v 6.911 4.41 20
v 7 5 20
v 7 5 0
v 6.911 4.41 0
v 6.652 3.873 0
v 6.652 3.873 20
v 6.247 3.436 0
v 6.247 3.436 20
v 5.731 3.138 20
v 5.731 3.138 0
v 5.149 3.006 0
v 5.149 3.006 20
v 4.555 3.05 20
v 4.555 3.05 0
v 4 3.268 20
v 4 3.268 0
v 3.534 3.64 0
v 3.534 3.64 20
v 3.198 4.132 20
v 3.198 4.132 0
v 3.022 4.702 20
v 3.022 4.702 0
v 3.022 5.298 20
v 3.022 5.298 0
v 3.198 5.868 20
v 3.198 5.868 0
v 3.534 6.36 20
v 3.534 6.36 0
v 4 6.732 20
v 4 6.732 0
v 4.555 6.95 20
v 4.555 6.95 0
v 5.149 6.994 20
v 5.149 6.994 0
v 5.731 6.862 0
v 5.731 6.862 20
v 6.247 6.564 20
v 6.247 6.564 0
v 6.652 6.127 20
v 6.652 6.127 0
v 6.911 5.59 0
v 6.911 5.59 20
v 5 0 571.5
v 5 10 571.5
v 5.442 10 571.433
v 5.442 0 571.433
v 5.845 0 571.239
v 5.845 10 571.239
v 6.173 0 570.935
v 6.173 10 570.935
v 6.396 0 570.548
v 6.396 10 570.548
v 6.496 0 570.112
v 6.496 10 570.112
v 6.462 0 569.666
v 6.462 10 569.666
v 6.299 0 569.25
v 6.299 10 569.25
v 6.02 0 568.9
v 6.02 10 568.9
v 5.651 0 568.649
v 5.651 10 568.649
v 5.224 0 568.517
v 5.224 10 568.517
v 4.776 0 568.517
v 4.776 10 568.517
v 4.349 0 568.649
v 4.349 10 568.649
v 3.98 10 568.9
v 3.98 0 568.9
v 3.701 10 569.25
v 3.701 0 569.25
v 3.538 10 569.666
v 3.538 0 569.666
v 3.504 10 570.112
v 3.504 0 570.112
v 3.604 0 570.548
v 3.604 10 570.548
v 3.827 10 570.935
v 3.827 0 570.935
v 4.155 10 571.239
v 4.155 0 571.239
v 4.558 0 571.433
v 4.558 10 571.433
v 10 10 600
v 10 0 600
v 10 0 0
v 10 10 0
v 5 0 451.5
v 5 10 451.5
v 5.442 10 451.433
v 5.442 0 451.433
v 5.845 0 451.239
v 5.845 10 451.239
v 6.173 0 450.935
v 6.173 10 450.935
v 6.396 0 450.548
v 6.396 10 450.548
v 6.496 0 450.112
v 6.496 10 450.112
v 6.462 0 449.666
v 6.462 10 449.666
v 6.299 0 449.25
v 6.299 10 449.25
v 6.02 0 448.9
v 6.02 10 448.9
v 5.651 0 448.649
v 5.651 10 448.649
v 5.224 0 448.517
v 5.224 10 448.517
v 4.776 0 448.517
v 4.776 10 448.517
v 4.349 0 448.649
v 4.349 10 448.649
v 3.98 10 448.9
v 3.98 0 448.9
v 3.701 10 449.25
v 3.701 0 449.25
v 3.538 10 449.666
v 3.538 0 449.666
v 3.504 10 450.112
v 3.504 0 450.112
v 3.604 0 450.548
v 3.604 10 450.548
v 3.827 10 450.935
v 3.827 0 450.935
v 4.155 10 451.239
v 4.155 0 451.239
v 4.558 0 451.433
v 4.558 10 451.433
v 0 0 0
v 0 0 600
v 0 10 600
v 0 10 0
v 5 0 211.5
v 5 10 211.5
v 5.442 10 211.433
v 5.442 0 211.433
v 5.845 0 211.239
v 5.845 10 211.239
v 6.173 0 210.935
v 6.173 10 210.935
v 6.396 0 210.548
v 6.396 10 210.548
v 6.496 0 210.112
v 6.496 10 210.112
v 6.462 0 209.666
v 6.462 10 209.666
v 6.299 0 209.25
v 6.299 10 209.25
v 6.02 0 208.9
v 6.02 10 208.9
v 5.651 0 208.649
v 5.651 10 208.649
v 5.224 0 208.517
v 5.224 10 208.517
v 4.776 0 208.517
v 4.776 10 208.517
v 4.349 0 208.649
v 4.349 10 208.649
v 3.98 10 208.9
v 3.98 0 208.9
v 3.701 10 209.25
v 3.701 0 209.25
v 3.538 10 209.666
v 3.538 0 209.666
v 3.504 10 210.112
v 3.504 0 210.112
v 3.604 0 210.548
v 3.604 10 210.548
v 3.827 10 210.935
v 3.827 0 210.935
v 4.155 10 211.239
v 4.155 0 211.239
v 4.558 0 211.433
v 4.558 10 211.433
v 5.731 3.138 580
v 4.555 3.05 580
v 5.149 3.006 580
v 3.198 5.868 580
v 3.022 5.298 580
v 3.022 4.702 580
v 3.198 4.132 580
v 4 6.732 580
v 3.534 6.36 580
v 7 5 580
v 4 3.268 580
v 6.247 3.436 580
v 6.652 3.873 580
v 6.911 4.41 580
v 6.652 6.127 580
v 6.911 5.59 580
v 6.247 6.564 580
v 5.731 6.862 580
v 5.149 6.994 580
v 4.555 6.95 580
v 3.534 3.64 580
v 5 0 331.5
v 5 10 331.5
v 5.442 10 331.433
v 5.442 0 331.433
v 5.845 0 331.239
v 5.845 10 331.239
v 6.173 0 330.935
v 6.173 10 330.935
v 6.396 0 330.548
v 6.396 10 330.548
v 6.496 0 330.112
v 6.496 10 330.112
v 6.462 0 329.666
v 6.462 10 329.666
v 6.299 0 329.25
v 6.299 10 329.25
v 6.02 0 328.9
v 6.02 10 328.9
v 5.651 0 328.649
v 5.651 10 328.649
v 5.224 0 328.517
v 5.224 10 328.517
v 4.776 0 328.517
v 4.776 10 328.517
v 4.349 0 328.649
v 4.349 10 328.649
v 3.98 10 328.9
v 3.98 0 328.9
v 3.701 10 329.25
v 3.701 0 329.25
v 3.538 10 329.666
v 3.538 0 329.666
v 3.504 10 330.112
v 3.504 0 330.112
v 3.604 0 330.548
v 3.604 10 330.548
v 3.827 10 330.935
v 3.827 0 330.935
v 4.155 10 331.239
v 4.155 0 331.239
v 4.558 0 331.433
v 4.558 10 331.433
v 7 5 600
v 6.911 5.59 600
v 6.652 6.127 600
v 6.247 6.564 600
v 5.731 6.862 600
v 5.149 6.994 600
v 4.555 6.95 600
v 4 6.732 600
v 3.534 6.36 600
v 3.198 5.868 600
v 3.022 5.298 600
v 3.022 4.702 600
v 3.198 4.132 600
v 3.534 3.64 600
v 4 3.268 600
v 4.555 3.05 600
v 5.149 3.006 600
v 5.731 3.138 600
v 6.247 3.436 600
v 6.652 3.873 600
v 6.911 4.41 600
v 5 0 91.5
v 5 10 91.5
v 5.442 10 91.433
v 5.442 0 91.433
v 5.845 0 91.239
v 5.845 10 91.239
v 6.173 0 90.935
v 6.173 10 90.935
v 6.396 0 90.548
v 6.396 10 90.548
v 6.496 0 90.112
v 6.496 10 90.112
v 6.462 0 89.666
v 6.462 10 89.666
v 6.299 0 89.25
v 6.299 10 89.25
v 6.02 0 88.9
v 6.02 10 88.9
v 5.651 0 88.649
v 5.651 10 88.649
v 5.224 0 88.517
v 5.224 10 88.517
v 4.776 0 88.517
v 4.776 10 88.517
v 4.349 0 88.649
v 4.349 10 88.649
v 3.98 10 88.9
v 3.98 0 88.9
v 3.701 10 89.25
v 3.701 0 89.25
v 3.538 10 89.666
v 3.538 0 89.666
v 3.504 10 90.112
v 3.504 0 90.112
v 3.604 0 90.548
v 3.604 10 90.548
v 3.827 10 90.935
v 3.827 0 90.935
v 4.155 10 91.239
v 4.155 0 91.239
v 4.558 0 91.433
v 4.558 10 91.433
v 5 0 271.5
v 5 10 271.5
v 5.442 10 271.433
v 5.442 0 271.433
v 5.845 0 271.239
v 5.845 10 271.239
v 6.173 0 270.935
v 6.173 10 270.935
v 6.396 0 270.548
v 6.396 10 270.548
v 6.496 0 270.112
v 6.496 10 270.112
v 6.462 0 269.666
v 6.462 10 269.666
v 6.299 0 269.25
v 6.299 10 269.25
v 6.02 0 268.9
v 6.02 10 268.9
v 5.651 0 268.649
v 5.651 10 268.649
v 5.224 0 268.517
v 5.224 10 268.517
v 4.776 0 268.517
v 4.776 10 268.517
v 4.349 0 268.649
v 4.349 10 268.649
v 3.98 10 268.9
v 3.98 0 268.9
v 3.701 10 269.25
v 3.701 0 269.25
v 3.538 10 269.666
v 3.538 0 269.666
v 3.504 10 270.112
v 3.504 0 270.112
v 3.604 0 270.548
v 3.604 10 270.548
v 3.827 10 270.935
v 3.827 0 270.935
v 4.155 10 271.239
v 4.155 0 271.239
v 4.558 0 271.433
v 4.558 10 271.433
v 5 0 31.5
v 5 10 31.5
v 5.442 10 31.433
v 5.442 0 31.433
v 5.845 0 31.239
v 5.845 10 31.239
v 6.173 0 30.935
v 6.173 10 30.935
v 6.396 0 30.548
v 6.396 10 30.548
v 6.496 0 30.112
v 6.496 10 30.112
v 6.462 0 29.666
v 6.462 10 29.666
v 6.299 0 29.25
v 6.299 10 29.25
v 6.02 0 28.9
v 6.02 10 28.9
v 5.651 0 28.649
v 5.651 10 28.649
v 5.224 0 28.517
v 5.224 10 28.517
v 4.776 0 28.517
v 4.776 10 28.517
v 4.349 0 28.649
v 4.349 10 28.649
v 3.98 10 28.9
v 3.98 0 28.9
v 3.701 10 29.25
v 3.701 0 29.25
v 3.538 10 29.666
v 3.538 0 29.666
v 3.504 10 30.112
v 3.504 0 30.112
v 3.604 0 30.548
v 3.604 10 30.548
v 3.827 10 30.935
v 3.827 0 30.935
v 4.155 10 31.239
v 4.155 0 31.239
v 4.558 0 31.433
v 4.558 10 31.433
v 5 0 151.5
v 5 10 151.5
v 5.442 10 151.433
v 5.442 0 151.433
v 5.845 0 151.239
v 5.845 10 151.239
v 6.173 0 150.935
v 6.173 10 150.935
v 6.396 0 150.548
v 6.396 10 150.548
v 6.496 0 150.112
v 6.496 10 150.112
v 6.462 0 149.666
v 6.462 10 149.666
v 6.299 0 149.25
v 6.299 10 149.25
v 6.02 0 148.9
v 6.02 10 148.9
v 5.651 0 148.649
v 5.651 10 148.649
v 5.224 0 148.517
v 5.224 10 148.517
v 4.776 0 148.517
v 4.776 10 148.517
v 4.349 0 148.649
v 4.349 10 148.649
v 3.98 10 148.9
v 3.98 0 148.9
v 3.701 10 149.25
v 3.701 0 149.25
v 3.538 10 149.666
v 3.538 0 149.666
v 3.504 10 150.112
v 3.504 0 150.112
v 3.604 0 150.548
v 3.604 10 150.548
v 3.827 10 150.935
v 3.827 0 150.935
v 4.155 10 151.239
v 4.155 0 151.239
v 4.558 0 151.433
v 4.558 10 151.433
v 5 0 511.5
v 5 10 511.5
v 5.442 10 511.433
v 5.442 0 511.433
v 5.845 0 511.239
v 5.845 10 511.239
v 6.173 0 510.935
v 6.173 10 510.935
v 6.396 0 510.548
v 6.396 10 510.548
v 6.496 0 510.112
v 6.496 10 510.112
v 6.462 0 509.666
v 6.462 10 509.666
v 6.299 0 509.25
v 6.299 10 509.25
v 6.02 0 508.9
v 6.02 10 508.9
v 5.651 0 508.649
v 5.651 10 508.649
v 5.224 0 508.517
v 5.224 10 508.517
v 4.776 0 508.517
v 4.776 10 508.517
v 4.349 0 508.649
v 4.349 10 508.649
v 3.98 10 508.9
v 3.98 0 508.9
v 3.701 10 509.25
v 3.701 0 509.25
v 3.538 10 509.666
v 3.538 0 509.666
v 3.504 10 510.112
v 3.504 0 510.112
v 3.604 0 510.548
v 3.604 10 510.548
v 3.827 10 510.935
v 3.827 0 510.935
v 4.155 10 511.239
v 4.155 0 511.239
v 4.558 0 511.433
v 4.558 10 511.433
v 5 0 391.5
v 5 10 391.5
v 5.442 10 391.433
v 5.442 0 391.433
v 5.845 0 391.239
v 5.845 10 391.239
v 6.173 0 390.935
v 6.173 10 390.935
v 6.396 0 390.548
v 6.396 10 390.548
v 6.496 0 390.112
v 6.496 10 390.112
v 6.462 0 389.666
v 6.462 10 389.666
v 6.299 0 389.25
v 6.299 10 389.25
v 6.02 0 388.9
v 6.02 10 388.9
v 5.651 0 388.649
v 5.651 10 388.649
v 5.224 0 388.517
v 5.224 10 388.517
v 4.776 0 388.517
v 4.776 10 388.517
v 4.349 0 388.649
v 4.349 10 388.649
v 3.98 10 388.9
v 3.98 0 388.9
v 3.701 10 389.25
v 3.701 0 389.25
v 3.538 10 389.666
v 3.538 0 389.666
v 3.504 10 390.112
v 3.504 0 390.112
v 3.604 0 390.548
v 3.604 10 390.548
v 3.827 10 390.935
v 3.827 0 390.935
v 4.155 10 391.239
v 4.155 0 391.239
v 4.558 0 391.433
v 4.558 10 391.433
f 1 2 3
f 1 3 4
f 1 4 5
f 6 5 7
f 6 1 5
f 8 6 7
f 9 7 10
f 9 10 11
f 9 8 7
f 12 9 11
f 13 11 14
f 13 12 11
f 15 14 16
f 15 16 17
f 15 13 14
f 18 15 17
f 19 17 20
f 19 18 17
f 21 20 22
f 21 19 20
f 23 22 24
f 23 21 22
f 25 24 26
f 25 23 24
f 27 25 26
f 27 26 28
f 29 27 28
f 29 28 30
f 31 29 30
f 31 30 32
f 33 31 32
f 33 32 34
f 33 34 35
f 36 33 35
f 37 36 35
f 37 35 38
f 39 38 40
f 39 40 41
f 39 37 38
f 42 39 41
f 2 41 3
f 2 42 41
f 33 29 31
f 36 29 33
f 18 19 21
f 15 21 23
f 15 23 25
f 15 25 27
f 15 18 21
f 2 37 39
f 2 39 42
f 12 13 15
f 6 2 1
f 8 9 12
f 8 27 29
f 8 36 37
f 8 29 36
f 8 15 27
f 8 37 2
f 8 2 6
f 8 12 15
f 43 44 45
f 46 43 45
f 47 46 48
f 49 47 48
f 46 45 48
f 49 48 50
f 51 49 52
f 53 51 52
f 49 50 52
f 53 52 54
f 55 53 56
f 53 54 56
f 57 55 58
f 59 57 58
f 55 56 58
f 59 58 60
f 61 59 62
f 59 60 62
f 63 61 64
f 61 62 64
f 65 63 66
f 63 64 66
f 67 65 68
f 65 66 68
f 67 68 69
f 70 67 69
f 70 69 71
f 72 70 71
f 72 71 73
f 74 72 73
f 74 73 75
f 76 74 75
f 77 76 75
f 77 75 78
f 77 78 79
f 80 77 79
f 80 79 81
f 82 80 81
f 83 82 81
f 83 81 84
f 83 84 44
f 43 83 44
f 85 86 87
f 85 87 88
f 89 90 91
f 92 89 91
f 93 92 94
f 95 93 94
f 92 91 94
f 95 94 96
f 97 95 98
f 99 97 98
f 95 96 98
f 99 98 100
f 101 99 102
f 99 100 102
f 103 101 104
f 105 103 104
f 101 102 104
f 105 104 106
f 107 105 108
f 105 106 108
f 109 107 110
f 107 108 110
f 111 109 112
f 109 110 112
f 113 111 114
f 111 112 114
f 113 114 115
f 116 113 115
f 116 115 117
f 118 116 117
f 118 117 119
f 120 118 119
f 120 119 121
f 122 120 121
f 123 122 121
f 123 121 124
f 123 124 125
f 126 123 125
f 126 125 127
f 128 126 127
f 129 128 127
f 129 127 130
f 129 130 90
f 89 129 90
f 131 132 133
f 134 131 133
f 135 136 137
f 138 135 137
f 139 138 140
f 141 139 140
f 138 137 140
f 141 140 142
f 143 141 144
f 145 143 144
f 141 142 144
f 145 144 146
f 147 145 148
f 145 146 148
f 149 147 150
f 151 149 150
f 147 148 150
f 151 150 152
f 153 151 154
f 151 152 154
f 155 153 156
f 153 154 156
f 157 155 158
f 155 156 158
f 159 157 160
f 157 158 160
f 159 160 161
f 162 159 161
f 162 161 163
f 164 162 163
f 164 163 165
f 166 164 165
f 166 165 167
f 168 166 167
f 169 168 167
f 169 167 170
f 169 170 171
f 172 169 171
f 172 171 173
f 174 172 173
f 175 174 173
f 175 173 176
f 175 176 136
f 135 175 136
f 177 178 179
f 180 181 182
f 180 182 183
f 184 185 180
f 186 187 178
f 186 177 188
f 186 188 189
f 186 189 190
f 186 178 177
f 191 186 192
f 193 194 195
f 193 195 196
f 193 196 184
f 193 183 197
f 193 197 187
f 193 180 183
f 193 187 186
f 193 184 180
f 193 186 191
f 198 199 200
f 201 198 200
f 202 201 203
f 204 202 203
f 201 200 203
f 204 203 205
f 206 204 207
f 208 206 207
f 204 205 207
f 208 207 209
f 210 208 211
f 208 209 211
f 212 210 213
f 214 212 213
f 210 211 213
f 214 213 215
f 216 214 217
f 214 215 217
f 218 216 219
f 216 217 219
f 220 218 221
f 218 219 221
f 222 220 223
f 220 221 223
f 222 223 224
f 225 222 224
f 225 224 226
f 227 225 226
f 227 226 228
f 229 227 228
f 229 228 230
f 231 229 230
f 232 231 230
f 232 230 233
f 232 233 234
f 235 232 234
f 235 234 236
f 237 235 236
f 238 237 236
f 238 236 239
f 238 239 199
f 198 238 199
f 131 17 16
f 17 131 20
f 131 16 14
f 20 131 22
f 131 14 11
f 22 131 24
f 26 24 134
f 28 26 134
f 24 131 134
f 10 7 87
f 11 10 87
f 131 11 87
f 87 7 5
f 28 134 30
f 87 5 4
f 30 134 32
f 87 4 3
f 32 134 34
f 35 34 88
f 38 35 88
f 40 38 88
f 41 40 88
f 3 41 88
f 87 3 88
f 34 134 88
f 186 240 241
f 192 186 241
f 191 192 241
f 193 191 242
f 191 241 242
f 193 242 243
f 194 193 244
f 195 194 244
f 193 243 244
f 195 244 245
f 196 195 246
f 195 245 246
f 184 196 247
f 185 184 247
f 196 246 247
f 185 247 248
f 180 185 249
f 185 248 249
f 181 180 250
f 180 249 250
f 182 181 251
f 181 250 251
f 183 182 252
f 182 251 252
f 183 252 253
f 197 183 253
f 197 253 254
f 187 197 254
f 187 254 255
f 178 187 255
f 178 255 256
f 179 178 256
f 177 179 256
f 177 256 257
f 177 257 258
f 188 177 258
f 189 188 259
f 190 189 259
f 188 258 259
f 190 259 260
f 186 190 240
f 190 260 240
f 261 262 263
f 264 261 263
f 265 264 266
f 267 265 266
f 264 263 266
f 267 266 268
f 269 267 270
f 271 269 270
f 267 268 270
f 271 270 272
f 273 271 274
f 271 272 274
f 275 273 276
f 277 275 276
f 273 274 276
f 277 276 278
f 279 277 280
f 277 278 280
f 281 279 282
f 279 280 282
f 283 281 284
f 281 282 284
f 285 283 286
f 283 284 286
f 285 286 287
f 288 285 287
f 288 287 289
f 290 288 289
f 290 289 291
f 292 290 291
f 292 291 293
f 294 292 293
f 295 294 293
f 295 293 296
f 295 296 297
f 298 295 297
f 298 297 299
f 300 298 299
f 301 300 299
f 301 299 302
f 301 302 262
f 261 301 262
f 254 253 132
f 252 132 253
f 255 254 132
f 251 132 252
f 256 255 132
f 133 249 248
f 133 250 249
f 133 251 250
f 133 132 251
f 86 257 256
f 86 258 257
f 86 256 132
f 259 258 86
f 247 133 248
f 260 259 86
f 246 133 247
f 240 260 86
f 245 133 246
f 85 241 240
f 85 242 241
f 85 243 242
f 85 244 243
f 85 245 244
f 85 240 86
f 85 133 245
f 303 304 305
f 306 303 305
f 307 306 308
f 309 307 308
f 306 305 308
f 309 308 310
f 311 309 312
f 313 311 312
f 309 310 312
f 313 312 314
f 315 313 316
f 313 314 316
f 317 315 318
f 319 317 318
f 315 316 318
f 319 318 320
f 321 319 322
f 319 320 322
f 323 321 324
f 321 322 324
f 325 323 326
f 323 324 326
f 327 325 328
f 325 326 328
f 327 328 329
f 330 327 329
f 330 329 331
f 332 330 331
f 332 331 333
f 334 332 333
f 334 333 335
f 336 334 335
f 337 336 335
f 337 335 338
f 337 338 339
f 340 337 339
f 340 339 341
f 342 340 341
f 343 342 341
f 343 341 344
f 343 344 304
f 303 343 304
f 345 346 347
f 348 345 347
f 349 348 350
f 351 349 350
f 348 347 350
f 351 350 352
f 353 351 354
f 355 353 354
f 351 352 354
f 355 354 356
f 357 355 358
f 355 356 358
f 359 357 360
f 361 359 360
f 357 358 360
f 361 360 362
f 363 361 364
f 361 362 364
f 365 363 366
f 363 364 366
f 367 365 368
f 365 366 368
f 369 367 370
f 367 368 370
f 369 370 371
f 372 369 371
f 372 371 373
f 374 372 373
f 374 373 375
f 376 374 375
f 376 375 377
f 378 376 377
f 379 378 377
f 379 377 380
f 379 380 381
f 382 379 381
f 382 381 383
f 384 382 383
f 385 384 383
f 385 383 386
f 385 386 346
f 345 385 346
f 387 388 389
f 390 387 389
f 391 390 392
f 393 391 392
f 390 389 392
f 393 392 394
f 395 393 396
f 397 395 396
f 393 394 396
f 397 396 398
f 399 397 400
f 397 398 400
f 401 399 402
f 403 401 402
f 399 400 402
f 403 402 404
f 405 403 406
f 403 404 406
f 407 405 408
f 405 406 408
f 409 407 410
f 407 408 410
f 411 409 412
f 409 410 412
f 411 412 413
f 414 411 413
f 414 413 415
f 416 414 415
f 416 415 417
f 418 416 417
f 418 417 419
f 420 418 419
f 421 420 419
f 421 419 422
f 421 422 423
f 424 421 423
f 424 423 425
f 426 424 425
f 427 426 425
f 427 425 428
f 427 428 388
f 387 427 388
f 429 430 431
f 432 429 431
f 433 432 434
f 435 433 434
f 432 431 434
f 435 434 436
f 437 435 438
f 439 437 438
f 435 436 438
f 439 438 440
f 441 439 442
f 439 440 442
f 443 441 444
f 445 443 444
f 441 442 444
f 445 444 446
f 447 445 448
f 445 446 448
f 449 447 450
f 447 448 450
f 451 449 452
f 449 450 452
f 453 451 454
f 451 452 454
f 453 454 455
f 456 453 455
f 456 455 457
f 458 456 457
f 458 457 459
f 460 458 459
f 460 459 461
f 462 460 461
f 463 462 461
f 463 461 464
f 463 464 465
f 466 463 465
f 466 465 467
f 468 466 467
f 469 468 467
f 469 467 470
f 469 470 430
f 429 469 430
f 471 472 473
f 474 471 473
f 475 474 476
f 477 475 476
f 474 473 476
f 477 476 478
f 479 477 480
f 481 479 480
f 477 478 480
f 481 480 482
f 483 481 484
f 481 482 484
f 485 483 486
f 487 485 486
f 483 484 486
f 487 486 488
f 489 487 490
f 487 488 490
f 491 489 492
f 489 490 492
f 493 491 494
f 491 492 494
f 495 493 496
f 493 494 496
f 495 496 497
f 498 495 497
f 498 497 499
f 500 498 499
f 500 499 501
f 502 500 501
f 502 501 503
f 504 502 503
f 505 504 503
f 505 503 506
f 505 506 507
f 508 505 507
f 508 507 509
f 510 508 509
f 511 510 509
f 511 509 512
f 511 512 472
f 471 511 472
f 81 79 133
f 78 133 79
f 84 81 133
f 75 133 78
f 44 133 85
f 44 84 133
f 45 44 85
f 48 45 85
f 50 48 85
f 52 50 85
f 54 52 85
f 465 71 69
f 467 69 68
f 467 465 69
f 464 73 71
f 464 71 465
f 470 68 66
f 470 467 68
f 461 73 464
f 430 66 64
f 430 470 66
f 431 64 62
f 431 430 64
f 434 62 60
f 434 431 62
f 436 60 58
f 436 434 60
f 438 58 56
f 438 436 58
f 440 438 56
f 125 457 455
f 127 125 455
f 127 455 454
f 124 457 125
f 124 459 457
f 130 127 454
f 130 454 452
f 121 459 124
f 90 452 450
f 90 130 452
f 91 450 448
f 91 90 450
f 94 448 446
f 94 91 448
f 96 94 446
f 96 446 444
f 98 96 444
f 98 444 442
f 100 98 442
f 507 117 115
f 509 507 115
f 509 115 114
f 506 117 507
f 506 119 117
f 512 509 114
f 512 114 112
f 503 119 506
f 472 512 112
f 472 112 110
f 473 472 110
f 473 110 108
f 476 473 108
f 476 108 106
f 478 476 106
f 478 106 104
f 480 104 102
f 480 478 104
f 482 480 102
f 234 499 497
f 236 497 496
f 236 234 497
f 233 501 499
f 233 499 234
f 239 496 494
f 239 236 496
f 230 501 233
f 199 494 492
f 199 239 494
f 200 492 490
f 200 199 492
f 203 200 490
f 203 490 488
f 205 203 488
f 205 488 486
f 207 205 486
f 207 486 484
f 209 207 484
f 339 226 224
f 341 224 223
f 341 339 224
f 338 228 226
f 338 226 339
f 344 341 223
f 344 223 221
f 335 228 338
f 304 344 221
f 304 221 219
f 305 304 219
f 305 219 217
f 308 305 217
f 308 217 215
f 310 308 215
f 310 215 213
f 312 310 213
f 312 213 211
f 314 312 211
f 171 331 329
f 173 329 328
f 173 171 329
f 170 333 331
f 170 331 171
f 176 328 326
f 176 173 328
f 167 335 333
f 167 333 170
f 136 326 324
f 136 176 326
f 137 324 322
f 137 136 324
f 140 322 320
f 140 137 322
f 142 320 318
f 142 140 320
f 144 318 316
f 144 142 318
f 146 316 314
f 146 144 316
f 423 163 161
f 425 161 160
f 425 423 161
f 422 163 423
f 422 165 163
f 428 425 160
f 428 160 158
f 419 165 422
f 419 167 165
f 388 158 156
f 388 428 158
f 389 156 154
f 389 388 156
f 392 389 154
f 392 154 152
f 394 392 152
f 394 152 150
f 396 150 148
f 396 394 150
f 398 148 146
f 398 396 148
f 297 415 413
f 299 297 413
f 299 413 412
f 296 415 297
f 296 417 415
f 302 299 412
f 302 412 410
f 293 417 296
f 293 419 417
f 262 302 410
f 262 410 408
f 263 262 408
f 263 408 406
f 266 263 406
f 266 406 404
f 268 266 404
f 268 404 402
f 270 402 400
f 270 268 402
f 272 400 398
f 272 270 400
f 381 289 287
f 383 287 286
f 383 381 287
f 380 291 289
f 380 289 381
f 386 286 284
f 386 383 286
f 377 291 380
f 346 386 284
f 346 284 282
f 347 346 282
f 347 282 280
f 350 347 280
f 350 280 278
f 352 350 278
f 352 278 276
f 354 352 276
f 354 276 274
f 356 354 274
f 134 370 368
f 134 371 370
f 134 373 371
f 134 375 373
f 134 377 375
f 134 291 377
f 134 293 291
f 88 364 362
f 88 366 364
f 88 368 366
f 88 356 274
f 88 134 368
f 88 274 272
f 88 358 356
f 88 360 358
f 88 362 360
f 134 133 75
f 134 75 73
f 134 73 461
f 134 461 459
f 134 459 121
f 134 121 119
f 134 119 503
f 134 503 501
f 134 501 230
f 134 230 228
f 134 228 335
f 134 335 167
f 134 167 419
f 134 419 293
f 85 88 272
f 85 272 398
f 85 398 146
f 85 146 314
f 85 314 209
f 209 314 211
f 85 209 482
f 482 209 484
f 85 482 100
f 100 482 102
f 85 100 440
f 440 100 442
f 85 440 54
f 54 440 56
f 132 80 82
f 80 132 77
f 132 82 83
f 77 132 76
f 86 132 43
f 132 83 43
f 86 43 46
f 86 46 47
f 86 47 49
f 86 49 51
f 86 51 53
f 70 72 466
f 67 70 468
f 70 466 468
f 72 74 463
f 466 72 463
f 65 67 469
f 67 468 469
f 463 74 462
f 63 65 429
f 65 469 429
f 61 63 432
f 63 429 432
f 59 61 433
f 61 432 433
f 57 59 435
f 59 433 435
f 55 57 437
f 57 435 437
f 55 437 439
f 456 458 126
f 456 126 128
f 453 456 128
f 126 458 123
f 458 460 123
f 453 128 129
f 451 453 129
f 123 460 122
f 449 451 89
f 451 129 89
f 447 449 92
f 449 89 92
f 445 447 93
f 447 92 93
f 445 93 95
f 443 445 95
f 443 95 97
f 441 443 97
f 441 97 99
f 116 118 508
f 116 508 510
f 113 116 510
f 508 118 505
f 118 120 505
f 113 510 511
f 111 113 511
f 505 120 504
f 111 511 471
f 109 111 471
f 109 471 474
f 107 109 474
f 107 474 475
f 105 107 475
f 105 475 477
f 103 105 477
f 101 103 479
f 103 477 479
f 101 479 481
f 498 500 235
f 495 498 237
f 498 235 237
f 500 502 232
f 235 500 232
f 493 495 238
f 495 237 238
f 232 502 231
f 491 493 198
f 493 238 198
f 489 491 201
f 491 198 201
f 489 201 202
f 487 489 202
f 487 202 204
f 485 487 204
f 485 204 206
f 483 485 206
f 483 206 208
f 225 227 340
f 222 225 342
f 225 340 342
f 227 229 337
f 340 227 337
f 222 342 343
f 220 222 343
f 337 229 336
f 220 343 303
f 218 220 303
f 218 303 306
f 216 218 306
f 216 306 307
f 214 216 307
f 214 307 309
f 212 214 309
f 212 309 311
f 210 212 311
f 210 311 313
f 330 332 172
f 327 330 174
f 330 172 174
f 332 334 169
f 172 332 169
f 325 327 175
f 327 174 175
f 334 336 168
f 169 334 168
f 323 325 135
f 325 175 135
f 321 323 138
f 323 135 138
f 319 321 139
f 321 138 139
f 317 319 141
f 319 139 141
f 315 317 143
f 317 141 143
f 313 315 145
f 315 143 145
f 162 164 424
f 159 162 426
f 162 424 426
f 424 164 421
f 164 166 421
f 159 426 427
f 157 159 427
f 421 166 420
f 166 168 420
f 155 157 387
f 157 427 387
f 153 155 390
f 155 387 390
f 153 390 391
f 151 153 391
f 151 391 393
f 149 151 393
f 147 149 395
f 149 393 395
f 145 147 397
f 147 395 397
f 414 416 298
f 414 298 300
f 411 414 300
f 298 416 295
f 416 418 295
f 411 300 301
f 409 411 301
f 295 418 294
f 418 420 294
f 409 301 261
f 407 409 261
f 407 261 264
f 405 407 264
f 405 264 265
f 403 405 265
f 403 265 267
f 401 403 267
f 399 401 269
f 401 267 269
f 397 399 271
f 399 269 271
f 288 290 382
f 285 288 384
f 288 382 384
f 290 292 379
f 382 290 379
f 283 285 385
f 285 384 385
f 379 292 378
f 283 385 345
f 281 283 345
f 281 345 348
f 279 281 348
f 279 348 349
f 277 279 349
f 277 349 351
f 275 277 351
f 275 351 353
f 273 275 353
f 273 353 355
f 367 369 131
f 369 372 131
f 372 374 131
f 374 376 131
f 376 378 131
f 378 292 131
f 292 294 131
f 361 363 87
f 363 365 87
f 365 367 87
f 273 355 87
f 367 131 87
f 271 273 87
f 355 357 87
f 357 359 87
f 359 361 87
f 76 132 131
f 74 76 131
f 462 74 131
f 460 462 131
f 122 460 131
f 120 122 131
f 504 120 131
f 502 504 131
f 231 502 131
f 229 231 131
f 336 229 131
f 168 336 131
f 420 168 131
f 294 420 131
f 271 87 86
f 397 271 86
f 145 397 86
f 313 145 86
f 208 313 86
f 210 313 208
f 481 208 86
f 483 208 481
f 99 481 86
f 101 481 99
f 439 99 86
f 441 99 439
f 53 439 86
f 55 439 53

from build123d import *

# Parameters (mm, degrees)
SKETCH1_W          = 10
SKETCH1_H          = 10
EXTRUDE1_DEPTH     = 600
SKETCH2_R          = 2
CUT_EXTRUDE1_DEPTH = 20
CUT_EXTRUDE2_START = -20
SKETCH3_R          = 2
CUT_EXTRUDE2_DEPTH = 20
SKETCH4_R          = 1.5
CUT_EXTRUDE3_DEPTH = 601.166643525
LPATTERN1_COUNT    = 10
LPATTERN1_PITCH    = 60


with BuildPart() as part:
    # Sketch1 → Extrude1 (new body)
    with BuildSketch(Plane.XY):
        with Locations((5, 5)):
            Rectangle(SKETCH1_W, SKETCH1_H)
    extrude(amount=EXTRUDE1_DEPTH)

    # Sketch2 → Cut-Extrude1 (cut)
    with BuildSketch(Plane.XY.offset(600)):
        with Locations((5, 5)):
            Circle(SKETCH2_R)
    extrude(amount=-CUT_EXTRUDE1_DEPTH, mode=Mode.SUBTRACT)

    # Sketch3 → Cut-Extrude2 (cut)
    with BuildSketch(Plane(origin=(0, 0, 0), x_dir=(-1, 0, 0), z_dir=(0, 0, -1)).offset(CUT_EXTRUDE2_START)):
        with Locations(Location((-5, 5, 0), (0, 0, 180))):
            Circle(SKETCH3_R)
    extrude(amount=CUT_EXTRUDE2_DEPTH, mode=Mode.SUBTRACT)

    # Sketch4 → Cut-Extrude3 (cut, through all)
    with BuildSketch(Plane(origin=(0, 10, 0), x_dir=(-1, 0, 0), z_dir=(0, 1, 0))):
        with Locations(Location((-5, 30, 0), (0, 0, 90))):
            Circle(SKETCH4_R)
    cut_extrude3 = extrude(amount=-CUT_EXTRUDE3_DEPTH, mode=Mode.SUBTRACT)

    # LPattern1: Cut-Extrude3 ×10
    with Locations(*[(0, 0, i * LPATTERN1_PITCH) for i in range(1, LPATTERN1_COUNT)]):
        add(cut_extrude3, mode=Mode.SUBTRACT)


solid = part.part
